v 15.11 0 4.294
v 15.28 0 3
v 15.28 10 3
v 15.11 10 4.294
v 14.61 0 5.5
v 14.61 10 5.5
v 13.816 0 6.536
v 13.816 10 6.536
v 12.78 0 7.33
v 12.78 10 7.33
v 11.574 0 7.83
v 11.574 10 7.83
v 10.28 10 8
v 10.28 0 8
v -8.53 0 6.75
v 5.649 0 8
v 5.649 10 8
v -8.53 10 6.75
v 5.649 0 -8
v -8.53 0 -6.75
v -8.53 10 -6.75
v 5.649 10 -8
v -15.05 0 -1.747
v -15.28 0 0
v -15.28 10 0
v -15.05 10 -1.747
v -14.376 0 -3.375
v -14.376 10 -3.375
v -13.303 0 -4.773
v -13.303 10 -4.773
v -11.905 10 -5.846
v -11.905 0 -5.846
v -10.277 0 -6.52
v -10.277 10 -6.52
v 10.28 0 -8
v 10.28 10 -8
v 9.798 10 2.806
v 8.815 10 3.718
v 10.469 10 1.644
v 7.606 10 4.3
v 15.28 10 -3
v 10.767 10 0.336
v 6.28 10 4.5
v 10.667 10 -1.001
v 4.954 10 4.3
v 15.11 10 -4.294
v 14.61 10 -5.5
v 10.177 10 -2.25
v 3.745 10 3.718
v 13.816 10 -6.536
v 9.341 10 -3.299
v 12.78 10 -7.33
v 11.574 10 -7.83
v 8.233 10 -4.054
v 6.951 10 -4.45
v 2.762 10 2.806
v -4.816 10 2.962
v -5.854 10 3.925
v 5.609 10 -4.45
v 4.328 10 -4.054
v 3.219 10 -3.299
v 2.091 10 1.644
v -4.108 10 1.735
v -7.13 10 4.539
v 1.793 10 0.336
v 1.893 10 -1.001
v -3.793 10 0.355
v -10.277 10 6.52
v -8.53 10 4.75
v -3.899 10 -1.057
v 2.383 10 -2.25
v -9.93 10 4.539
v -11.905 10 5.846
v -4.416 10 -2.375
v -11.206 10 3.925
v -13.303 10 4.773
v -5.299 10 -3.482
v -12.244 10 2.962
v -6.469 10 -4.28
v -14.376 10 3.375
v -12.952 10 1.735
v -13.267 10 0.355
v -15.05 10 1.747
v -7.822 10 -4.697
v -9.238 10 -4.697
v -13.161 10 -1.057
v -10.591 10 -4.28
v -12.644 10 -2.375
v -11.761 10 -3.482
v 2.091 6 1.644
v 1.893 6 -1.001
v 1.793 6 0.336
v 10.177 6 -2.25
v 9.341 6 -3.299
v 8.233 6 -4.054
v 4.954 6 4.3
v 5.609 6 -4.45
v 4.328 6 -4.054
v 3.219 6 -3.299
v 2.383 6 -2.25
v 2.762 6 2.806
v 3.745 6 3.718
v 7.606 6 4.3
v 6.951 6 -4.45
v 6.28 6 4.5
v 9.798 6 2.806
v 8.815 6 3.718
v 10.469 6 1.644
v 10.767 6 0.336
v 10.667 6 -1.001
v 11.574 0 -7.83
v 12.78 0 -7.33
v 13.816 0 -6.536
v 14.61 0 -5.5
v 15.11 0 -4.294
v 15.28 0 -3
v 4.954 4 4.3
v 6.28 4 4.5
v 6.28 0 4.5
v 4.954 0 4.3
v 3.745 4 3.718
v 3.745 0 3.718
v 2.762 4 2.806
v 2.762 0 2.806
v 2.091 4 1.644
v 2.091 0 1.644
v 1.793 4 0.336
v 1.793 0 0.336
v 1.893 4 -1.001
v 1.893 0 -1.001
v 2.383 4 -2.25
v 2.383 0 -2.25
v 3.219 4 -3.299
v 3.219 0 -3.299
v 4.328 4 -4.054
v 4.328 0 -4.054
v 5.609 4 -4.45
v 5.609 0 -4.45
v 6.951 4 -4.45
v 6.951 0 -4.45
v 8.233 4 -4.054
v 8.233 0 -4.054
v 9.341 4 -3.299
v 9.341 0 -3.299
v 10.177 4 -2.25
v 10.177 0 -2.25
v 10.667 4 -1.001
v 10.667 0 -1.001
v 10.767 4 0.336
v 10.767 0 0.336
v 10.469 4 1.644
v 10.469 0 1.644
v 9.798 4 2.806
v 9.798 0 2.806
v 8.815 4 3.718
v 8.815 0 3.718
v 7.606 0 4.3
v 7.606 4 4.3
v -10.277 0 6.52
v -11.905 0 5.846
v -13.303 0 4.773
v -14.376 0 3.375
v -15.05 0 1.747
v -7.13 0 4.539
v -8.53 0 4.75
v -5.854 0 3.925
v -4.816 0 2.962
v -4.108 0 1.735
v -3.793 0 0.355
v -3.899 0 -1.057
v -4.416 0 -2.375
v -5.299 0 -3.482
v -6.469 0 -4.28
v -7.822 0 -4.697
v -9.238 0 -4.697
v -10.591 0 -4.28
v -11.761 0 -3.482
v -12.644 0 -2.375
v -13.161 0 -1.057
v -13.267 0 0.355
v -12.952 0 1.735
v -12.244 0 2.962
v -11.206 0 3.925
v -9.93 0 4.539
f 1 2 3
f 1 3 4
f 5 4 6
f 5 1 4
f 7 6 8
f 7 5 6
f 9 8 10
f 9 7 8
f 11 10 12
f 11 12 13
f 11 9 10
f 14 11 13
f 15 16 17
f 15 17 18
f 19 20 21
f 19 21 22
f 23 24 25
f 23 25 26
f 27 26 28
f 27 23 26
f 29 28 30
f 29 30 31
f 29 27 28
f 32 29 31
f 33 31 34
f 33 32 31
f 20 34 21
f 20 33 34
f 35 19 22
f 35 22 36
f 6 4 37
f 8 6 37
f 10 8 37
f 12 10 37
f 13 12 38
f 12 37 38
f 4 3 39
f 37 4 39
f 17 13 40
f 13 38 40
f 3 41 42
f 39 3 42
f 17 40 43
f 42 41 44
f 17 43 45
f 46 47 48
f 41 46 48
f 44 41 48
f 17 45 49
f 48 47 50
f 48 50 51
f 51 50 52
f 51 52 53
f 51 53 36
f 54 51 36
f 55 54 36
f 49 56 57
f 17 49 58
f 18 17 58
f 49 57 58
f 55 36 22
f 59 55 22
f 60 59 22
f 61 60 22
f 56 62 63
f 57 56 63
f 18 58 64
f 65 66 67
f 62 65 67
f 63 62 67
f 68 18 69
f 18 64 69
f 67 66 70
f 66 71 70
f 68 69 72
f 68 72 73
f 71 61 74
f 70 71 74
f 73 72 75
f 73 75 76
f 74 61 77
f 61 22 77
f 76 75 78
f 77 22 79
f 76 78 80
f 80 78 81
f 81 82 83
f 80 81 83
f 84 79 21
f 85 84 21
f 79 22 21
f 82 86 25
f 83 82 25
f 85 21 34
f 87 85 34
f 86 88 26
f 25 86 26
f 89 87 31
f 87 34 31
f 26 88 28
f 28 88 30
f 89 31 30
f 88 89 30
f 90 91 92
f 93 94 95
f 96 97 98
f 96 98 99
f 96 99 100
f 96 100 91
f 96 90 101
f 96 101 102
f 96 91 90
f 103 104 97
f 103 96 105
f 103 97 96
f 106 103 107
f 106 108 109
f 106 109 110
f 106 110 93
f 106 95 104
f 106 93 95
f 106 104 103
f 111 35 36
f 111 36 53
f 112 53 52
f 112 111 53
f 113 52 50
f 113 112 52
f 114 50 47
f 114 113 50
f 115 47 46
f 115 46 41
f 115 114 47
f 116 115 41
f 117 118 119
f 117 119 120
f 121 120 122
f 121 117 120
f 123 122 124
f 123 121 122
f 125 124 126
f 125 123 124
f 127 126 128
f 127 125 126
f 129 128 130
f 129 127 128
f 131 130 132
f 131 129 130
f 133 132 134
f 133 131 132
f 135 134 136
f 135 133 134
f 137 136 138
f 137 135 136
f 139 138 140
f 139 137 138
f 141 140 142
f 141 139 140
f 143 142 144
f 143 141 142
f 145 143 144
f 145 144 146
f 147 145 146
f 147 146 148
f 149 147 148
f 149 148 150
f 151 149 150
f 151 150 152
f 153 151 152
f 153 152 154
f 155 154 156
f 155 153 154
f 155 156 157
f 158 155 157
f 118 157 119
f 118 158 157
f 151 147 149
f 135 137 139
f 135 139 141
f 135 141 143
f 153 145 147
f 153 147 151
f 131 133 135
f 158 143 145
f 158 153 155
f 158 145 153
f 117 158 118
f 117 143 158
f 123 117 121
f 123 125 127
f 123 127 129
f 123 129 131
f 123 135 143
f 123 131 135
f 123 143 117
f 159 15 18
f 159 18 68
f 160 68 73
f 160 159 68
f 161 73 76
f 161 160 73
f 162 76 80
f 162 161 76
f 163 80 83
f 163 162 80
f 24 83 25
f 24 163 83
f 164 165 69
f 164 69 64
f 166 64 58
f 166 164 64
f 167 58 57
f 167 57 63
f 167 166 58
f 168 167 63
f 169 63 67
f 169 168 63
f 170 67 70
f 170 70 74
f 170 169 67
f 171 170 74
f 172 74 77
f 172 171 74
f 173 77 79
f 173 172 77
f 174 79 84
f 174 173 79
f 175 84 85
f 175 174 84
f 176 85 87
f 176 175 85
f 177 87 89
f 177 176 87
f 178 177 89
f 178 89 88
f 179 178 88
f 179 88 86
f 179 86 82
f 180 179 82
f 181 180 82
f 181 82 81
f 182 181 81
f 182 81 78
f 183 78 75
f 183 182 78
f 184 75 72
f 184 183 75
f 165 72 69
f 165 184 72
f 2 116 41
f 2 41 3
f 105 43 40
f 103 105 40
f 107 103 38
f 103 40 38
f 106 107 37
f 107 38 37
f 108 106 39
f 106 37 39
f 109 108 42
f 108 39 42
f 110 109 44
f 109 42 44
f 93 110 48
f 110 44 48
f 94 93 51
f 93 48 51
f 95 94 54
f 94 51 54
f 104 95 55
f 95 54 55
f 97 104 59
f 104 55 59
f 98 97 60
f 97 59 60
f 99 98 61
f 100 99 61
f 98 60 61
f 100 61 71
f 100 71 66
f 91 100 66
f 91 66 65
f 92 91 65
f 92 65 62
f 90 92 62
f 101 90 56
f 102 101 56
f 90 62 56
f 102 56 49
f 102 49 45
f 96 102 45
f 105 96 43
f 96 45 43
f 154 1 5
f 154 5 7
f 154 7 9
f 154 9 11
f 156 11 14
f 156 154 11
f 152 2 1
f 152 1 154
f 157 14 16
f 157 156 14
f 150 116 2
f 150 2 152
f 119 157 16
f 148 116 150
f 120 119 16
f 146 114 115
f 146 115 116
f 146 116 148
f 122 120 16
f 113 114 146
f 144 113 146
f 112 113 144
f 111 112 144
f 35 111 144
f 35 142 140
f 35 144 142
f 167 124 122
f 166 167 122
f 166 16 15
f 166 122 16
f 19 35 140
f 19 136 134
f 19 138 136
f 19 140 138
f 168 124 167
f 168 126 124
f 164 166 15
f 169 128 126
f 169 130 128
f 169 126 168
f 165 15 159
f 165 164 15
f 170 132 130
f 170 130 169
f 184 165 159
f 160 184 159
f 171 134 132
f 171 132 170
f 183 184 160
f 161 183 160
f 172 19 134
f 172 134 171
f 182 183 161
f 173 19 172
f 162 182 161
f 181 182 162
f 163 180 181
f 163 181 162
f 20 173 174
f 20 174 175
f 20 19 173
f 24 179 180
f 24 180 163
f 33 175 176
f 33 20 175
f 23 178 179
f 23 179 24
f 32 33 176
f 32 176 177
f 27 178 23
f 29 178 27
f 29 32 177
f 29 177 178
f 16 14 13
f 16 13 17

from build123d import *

# Parameters (mm, degrees)
SKETCH1_R           = 4.75
BOSS_EXTRUDE1_DEPTH = 10
SKETCH2_R           = 4.5
CUT_EXTRUDE1_DEPTH  = 4
CUT_EXTRUDE2_START  = -4
SKETCH4_R           = 4.5
CUT_EXTRUDE2_DEPTH  = 4


with BuildPart() as part:
    # Sketch1 → Boss-Extrude1 (new body)
    with BuildSketch(Plane(origin=(0, 0, 0), x_dir=(1, 0, 0), z_dir=(0, 1, 0))):
        with BuildLine():
            Line((5.649139951, 8), (10.28, 8))
            ThreePointArc((10.28, 8), (13.815533906, 6.535533906), (15.28, 3))
            Line((15.28, 3), (15.28, -3))
            ThreePointArc((15.28, -3), (13.815533906, -6.535533906), (10.28, -8))
            Line((10.28, -8), (5.649139951, -8))
            Line((5.649139951, -8), (-8.529960299, -6.75))
            ThreePointArc((-8.529960299, -6.75), (-13.302950922, -4.772978995), (-15.28, 0))
            ThreePointArc((-15.28, 0), (-13.302950922, 4.772978995), (-8.529960299, 6.75))
            Line((-8.529960299, 6.75), (5.649139951, 8))
        make_face()
        with Locations(Location((-8.529960299, 0, 0), (0, 0, 270))):
            Circle(SKETCH1_R, mode=Mode.SUBTRACT)
    extrude(amount=BOSS_EXTRUDE1_DEPTH)

    # Sketch2 → Cut-Extrude1 (cut)
    with BuildSketch(Plane(origin=(0, 10, 0), x_dir=(1, 0, 0), z_dir=(0, 1, 0))):
        with Locations(Location((6.280039701, 0, 0), (0, 0, 270))):
            Circle(SKETCH2_R)
    extrude(amount=-CUT_EXTRUDE1_DEPTH, mode=Mode.SUBTRACT)

    # Sketch4 → Cut-Extrude2 (cut)
    with BuildSketch(Plane.XZ.offset(CUT_EXTRUDE2_START)):
        with Locations(Location((6.280039701, 0, 0), (0, 0, 90))):
            Circle(SKETCH4_R)
    extrude(amount=CUT_EXTRUDE2_DEPTH, mode=Mode.SUBTRACT)


solid = part.part
